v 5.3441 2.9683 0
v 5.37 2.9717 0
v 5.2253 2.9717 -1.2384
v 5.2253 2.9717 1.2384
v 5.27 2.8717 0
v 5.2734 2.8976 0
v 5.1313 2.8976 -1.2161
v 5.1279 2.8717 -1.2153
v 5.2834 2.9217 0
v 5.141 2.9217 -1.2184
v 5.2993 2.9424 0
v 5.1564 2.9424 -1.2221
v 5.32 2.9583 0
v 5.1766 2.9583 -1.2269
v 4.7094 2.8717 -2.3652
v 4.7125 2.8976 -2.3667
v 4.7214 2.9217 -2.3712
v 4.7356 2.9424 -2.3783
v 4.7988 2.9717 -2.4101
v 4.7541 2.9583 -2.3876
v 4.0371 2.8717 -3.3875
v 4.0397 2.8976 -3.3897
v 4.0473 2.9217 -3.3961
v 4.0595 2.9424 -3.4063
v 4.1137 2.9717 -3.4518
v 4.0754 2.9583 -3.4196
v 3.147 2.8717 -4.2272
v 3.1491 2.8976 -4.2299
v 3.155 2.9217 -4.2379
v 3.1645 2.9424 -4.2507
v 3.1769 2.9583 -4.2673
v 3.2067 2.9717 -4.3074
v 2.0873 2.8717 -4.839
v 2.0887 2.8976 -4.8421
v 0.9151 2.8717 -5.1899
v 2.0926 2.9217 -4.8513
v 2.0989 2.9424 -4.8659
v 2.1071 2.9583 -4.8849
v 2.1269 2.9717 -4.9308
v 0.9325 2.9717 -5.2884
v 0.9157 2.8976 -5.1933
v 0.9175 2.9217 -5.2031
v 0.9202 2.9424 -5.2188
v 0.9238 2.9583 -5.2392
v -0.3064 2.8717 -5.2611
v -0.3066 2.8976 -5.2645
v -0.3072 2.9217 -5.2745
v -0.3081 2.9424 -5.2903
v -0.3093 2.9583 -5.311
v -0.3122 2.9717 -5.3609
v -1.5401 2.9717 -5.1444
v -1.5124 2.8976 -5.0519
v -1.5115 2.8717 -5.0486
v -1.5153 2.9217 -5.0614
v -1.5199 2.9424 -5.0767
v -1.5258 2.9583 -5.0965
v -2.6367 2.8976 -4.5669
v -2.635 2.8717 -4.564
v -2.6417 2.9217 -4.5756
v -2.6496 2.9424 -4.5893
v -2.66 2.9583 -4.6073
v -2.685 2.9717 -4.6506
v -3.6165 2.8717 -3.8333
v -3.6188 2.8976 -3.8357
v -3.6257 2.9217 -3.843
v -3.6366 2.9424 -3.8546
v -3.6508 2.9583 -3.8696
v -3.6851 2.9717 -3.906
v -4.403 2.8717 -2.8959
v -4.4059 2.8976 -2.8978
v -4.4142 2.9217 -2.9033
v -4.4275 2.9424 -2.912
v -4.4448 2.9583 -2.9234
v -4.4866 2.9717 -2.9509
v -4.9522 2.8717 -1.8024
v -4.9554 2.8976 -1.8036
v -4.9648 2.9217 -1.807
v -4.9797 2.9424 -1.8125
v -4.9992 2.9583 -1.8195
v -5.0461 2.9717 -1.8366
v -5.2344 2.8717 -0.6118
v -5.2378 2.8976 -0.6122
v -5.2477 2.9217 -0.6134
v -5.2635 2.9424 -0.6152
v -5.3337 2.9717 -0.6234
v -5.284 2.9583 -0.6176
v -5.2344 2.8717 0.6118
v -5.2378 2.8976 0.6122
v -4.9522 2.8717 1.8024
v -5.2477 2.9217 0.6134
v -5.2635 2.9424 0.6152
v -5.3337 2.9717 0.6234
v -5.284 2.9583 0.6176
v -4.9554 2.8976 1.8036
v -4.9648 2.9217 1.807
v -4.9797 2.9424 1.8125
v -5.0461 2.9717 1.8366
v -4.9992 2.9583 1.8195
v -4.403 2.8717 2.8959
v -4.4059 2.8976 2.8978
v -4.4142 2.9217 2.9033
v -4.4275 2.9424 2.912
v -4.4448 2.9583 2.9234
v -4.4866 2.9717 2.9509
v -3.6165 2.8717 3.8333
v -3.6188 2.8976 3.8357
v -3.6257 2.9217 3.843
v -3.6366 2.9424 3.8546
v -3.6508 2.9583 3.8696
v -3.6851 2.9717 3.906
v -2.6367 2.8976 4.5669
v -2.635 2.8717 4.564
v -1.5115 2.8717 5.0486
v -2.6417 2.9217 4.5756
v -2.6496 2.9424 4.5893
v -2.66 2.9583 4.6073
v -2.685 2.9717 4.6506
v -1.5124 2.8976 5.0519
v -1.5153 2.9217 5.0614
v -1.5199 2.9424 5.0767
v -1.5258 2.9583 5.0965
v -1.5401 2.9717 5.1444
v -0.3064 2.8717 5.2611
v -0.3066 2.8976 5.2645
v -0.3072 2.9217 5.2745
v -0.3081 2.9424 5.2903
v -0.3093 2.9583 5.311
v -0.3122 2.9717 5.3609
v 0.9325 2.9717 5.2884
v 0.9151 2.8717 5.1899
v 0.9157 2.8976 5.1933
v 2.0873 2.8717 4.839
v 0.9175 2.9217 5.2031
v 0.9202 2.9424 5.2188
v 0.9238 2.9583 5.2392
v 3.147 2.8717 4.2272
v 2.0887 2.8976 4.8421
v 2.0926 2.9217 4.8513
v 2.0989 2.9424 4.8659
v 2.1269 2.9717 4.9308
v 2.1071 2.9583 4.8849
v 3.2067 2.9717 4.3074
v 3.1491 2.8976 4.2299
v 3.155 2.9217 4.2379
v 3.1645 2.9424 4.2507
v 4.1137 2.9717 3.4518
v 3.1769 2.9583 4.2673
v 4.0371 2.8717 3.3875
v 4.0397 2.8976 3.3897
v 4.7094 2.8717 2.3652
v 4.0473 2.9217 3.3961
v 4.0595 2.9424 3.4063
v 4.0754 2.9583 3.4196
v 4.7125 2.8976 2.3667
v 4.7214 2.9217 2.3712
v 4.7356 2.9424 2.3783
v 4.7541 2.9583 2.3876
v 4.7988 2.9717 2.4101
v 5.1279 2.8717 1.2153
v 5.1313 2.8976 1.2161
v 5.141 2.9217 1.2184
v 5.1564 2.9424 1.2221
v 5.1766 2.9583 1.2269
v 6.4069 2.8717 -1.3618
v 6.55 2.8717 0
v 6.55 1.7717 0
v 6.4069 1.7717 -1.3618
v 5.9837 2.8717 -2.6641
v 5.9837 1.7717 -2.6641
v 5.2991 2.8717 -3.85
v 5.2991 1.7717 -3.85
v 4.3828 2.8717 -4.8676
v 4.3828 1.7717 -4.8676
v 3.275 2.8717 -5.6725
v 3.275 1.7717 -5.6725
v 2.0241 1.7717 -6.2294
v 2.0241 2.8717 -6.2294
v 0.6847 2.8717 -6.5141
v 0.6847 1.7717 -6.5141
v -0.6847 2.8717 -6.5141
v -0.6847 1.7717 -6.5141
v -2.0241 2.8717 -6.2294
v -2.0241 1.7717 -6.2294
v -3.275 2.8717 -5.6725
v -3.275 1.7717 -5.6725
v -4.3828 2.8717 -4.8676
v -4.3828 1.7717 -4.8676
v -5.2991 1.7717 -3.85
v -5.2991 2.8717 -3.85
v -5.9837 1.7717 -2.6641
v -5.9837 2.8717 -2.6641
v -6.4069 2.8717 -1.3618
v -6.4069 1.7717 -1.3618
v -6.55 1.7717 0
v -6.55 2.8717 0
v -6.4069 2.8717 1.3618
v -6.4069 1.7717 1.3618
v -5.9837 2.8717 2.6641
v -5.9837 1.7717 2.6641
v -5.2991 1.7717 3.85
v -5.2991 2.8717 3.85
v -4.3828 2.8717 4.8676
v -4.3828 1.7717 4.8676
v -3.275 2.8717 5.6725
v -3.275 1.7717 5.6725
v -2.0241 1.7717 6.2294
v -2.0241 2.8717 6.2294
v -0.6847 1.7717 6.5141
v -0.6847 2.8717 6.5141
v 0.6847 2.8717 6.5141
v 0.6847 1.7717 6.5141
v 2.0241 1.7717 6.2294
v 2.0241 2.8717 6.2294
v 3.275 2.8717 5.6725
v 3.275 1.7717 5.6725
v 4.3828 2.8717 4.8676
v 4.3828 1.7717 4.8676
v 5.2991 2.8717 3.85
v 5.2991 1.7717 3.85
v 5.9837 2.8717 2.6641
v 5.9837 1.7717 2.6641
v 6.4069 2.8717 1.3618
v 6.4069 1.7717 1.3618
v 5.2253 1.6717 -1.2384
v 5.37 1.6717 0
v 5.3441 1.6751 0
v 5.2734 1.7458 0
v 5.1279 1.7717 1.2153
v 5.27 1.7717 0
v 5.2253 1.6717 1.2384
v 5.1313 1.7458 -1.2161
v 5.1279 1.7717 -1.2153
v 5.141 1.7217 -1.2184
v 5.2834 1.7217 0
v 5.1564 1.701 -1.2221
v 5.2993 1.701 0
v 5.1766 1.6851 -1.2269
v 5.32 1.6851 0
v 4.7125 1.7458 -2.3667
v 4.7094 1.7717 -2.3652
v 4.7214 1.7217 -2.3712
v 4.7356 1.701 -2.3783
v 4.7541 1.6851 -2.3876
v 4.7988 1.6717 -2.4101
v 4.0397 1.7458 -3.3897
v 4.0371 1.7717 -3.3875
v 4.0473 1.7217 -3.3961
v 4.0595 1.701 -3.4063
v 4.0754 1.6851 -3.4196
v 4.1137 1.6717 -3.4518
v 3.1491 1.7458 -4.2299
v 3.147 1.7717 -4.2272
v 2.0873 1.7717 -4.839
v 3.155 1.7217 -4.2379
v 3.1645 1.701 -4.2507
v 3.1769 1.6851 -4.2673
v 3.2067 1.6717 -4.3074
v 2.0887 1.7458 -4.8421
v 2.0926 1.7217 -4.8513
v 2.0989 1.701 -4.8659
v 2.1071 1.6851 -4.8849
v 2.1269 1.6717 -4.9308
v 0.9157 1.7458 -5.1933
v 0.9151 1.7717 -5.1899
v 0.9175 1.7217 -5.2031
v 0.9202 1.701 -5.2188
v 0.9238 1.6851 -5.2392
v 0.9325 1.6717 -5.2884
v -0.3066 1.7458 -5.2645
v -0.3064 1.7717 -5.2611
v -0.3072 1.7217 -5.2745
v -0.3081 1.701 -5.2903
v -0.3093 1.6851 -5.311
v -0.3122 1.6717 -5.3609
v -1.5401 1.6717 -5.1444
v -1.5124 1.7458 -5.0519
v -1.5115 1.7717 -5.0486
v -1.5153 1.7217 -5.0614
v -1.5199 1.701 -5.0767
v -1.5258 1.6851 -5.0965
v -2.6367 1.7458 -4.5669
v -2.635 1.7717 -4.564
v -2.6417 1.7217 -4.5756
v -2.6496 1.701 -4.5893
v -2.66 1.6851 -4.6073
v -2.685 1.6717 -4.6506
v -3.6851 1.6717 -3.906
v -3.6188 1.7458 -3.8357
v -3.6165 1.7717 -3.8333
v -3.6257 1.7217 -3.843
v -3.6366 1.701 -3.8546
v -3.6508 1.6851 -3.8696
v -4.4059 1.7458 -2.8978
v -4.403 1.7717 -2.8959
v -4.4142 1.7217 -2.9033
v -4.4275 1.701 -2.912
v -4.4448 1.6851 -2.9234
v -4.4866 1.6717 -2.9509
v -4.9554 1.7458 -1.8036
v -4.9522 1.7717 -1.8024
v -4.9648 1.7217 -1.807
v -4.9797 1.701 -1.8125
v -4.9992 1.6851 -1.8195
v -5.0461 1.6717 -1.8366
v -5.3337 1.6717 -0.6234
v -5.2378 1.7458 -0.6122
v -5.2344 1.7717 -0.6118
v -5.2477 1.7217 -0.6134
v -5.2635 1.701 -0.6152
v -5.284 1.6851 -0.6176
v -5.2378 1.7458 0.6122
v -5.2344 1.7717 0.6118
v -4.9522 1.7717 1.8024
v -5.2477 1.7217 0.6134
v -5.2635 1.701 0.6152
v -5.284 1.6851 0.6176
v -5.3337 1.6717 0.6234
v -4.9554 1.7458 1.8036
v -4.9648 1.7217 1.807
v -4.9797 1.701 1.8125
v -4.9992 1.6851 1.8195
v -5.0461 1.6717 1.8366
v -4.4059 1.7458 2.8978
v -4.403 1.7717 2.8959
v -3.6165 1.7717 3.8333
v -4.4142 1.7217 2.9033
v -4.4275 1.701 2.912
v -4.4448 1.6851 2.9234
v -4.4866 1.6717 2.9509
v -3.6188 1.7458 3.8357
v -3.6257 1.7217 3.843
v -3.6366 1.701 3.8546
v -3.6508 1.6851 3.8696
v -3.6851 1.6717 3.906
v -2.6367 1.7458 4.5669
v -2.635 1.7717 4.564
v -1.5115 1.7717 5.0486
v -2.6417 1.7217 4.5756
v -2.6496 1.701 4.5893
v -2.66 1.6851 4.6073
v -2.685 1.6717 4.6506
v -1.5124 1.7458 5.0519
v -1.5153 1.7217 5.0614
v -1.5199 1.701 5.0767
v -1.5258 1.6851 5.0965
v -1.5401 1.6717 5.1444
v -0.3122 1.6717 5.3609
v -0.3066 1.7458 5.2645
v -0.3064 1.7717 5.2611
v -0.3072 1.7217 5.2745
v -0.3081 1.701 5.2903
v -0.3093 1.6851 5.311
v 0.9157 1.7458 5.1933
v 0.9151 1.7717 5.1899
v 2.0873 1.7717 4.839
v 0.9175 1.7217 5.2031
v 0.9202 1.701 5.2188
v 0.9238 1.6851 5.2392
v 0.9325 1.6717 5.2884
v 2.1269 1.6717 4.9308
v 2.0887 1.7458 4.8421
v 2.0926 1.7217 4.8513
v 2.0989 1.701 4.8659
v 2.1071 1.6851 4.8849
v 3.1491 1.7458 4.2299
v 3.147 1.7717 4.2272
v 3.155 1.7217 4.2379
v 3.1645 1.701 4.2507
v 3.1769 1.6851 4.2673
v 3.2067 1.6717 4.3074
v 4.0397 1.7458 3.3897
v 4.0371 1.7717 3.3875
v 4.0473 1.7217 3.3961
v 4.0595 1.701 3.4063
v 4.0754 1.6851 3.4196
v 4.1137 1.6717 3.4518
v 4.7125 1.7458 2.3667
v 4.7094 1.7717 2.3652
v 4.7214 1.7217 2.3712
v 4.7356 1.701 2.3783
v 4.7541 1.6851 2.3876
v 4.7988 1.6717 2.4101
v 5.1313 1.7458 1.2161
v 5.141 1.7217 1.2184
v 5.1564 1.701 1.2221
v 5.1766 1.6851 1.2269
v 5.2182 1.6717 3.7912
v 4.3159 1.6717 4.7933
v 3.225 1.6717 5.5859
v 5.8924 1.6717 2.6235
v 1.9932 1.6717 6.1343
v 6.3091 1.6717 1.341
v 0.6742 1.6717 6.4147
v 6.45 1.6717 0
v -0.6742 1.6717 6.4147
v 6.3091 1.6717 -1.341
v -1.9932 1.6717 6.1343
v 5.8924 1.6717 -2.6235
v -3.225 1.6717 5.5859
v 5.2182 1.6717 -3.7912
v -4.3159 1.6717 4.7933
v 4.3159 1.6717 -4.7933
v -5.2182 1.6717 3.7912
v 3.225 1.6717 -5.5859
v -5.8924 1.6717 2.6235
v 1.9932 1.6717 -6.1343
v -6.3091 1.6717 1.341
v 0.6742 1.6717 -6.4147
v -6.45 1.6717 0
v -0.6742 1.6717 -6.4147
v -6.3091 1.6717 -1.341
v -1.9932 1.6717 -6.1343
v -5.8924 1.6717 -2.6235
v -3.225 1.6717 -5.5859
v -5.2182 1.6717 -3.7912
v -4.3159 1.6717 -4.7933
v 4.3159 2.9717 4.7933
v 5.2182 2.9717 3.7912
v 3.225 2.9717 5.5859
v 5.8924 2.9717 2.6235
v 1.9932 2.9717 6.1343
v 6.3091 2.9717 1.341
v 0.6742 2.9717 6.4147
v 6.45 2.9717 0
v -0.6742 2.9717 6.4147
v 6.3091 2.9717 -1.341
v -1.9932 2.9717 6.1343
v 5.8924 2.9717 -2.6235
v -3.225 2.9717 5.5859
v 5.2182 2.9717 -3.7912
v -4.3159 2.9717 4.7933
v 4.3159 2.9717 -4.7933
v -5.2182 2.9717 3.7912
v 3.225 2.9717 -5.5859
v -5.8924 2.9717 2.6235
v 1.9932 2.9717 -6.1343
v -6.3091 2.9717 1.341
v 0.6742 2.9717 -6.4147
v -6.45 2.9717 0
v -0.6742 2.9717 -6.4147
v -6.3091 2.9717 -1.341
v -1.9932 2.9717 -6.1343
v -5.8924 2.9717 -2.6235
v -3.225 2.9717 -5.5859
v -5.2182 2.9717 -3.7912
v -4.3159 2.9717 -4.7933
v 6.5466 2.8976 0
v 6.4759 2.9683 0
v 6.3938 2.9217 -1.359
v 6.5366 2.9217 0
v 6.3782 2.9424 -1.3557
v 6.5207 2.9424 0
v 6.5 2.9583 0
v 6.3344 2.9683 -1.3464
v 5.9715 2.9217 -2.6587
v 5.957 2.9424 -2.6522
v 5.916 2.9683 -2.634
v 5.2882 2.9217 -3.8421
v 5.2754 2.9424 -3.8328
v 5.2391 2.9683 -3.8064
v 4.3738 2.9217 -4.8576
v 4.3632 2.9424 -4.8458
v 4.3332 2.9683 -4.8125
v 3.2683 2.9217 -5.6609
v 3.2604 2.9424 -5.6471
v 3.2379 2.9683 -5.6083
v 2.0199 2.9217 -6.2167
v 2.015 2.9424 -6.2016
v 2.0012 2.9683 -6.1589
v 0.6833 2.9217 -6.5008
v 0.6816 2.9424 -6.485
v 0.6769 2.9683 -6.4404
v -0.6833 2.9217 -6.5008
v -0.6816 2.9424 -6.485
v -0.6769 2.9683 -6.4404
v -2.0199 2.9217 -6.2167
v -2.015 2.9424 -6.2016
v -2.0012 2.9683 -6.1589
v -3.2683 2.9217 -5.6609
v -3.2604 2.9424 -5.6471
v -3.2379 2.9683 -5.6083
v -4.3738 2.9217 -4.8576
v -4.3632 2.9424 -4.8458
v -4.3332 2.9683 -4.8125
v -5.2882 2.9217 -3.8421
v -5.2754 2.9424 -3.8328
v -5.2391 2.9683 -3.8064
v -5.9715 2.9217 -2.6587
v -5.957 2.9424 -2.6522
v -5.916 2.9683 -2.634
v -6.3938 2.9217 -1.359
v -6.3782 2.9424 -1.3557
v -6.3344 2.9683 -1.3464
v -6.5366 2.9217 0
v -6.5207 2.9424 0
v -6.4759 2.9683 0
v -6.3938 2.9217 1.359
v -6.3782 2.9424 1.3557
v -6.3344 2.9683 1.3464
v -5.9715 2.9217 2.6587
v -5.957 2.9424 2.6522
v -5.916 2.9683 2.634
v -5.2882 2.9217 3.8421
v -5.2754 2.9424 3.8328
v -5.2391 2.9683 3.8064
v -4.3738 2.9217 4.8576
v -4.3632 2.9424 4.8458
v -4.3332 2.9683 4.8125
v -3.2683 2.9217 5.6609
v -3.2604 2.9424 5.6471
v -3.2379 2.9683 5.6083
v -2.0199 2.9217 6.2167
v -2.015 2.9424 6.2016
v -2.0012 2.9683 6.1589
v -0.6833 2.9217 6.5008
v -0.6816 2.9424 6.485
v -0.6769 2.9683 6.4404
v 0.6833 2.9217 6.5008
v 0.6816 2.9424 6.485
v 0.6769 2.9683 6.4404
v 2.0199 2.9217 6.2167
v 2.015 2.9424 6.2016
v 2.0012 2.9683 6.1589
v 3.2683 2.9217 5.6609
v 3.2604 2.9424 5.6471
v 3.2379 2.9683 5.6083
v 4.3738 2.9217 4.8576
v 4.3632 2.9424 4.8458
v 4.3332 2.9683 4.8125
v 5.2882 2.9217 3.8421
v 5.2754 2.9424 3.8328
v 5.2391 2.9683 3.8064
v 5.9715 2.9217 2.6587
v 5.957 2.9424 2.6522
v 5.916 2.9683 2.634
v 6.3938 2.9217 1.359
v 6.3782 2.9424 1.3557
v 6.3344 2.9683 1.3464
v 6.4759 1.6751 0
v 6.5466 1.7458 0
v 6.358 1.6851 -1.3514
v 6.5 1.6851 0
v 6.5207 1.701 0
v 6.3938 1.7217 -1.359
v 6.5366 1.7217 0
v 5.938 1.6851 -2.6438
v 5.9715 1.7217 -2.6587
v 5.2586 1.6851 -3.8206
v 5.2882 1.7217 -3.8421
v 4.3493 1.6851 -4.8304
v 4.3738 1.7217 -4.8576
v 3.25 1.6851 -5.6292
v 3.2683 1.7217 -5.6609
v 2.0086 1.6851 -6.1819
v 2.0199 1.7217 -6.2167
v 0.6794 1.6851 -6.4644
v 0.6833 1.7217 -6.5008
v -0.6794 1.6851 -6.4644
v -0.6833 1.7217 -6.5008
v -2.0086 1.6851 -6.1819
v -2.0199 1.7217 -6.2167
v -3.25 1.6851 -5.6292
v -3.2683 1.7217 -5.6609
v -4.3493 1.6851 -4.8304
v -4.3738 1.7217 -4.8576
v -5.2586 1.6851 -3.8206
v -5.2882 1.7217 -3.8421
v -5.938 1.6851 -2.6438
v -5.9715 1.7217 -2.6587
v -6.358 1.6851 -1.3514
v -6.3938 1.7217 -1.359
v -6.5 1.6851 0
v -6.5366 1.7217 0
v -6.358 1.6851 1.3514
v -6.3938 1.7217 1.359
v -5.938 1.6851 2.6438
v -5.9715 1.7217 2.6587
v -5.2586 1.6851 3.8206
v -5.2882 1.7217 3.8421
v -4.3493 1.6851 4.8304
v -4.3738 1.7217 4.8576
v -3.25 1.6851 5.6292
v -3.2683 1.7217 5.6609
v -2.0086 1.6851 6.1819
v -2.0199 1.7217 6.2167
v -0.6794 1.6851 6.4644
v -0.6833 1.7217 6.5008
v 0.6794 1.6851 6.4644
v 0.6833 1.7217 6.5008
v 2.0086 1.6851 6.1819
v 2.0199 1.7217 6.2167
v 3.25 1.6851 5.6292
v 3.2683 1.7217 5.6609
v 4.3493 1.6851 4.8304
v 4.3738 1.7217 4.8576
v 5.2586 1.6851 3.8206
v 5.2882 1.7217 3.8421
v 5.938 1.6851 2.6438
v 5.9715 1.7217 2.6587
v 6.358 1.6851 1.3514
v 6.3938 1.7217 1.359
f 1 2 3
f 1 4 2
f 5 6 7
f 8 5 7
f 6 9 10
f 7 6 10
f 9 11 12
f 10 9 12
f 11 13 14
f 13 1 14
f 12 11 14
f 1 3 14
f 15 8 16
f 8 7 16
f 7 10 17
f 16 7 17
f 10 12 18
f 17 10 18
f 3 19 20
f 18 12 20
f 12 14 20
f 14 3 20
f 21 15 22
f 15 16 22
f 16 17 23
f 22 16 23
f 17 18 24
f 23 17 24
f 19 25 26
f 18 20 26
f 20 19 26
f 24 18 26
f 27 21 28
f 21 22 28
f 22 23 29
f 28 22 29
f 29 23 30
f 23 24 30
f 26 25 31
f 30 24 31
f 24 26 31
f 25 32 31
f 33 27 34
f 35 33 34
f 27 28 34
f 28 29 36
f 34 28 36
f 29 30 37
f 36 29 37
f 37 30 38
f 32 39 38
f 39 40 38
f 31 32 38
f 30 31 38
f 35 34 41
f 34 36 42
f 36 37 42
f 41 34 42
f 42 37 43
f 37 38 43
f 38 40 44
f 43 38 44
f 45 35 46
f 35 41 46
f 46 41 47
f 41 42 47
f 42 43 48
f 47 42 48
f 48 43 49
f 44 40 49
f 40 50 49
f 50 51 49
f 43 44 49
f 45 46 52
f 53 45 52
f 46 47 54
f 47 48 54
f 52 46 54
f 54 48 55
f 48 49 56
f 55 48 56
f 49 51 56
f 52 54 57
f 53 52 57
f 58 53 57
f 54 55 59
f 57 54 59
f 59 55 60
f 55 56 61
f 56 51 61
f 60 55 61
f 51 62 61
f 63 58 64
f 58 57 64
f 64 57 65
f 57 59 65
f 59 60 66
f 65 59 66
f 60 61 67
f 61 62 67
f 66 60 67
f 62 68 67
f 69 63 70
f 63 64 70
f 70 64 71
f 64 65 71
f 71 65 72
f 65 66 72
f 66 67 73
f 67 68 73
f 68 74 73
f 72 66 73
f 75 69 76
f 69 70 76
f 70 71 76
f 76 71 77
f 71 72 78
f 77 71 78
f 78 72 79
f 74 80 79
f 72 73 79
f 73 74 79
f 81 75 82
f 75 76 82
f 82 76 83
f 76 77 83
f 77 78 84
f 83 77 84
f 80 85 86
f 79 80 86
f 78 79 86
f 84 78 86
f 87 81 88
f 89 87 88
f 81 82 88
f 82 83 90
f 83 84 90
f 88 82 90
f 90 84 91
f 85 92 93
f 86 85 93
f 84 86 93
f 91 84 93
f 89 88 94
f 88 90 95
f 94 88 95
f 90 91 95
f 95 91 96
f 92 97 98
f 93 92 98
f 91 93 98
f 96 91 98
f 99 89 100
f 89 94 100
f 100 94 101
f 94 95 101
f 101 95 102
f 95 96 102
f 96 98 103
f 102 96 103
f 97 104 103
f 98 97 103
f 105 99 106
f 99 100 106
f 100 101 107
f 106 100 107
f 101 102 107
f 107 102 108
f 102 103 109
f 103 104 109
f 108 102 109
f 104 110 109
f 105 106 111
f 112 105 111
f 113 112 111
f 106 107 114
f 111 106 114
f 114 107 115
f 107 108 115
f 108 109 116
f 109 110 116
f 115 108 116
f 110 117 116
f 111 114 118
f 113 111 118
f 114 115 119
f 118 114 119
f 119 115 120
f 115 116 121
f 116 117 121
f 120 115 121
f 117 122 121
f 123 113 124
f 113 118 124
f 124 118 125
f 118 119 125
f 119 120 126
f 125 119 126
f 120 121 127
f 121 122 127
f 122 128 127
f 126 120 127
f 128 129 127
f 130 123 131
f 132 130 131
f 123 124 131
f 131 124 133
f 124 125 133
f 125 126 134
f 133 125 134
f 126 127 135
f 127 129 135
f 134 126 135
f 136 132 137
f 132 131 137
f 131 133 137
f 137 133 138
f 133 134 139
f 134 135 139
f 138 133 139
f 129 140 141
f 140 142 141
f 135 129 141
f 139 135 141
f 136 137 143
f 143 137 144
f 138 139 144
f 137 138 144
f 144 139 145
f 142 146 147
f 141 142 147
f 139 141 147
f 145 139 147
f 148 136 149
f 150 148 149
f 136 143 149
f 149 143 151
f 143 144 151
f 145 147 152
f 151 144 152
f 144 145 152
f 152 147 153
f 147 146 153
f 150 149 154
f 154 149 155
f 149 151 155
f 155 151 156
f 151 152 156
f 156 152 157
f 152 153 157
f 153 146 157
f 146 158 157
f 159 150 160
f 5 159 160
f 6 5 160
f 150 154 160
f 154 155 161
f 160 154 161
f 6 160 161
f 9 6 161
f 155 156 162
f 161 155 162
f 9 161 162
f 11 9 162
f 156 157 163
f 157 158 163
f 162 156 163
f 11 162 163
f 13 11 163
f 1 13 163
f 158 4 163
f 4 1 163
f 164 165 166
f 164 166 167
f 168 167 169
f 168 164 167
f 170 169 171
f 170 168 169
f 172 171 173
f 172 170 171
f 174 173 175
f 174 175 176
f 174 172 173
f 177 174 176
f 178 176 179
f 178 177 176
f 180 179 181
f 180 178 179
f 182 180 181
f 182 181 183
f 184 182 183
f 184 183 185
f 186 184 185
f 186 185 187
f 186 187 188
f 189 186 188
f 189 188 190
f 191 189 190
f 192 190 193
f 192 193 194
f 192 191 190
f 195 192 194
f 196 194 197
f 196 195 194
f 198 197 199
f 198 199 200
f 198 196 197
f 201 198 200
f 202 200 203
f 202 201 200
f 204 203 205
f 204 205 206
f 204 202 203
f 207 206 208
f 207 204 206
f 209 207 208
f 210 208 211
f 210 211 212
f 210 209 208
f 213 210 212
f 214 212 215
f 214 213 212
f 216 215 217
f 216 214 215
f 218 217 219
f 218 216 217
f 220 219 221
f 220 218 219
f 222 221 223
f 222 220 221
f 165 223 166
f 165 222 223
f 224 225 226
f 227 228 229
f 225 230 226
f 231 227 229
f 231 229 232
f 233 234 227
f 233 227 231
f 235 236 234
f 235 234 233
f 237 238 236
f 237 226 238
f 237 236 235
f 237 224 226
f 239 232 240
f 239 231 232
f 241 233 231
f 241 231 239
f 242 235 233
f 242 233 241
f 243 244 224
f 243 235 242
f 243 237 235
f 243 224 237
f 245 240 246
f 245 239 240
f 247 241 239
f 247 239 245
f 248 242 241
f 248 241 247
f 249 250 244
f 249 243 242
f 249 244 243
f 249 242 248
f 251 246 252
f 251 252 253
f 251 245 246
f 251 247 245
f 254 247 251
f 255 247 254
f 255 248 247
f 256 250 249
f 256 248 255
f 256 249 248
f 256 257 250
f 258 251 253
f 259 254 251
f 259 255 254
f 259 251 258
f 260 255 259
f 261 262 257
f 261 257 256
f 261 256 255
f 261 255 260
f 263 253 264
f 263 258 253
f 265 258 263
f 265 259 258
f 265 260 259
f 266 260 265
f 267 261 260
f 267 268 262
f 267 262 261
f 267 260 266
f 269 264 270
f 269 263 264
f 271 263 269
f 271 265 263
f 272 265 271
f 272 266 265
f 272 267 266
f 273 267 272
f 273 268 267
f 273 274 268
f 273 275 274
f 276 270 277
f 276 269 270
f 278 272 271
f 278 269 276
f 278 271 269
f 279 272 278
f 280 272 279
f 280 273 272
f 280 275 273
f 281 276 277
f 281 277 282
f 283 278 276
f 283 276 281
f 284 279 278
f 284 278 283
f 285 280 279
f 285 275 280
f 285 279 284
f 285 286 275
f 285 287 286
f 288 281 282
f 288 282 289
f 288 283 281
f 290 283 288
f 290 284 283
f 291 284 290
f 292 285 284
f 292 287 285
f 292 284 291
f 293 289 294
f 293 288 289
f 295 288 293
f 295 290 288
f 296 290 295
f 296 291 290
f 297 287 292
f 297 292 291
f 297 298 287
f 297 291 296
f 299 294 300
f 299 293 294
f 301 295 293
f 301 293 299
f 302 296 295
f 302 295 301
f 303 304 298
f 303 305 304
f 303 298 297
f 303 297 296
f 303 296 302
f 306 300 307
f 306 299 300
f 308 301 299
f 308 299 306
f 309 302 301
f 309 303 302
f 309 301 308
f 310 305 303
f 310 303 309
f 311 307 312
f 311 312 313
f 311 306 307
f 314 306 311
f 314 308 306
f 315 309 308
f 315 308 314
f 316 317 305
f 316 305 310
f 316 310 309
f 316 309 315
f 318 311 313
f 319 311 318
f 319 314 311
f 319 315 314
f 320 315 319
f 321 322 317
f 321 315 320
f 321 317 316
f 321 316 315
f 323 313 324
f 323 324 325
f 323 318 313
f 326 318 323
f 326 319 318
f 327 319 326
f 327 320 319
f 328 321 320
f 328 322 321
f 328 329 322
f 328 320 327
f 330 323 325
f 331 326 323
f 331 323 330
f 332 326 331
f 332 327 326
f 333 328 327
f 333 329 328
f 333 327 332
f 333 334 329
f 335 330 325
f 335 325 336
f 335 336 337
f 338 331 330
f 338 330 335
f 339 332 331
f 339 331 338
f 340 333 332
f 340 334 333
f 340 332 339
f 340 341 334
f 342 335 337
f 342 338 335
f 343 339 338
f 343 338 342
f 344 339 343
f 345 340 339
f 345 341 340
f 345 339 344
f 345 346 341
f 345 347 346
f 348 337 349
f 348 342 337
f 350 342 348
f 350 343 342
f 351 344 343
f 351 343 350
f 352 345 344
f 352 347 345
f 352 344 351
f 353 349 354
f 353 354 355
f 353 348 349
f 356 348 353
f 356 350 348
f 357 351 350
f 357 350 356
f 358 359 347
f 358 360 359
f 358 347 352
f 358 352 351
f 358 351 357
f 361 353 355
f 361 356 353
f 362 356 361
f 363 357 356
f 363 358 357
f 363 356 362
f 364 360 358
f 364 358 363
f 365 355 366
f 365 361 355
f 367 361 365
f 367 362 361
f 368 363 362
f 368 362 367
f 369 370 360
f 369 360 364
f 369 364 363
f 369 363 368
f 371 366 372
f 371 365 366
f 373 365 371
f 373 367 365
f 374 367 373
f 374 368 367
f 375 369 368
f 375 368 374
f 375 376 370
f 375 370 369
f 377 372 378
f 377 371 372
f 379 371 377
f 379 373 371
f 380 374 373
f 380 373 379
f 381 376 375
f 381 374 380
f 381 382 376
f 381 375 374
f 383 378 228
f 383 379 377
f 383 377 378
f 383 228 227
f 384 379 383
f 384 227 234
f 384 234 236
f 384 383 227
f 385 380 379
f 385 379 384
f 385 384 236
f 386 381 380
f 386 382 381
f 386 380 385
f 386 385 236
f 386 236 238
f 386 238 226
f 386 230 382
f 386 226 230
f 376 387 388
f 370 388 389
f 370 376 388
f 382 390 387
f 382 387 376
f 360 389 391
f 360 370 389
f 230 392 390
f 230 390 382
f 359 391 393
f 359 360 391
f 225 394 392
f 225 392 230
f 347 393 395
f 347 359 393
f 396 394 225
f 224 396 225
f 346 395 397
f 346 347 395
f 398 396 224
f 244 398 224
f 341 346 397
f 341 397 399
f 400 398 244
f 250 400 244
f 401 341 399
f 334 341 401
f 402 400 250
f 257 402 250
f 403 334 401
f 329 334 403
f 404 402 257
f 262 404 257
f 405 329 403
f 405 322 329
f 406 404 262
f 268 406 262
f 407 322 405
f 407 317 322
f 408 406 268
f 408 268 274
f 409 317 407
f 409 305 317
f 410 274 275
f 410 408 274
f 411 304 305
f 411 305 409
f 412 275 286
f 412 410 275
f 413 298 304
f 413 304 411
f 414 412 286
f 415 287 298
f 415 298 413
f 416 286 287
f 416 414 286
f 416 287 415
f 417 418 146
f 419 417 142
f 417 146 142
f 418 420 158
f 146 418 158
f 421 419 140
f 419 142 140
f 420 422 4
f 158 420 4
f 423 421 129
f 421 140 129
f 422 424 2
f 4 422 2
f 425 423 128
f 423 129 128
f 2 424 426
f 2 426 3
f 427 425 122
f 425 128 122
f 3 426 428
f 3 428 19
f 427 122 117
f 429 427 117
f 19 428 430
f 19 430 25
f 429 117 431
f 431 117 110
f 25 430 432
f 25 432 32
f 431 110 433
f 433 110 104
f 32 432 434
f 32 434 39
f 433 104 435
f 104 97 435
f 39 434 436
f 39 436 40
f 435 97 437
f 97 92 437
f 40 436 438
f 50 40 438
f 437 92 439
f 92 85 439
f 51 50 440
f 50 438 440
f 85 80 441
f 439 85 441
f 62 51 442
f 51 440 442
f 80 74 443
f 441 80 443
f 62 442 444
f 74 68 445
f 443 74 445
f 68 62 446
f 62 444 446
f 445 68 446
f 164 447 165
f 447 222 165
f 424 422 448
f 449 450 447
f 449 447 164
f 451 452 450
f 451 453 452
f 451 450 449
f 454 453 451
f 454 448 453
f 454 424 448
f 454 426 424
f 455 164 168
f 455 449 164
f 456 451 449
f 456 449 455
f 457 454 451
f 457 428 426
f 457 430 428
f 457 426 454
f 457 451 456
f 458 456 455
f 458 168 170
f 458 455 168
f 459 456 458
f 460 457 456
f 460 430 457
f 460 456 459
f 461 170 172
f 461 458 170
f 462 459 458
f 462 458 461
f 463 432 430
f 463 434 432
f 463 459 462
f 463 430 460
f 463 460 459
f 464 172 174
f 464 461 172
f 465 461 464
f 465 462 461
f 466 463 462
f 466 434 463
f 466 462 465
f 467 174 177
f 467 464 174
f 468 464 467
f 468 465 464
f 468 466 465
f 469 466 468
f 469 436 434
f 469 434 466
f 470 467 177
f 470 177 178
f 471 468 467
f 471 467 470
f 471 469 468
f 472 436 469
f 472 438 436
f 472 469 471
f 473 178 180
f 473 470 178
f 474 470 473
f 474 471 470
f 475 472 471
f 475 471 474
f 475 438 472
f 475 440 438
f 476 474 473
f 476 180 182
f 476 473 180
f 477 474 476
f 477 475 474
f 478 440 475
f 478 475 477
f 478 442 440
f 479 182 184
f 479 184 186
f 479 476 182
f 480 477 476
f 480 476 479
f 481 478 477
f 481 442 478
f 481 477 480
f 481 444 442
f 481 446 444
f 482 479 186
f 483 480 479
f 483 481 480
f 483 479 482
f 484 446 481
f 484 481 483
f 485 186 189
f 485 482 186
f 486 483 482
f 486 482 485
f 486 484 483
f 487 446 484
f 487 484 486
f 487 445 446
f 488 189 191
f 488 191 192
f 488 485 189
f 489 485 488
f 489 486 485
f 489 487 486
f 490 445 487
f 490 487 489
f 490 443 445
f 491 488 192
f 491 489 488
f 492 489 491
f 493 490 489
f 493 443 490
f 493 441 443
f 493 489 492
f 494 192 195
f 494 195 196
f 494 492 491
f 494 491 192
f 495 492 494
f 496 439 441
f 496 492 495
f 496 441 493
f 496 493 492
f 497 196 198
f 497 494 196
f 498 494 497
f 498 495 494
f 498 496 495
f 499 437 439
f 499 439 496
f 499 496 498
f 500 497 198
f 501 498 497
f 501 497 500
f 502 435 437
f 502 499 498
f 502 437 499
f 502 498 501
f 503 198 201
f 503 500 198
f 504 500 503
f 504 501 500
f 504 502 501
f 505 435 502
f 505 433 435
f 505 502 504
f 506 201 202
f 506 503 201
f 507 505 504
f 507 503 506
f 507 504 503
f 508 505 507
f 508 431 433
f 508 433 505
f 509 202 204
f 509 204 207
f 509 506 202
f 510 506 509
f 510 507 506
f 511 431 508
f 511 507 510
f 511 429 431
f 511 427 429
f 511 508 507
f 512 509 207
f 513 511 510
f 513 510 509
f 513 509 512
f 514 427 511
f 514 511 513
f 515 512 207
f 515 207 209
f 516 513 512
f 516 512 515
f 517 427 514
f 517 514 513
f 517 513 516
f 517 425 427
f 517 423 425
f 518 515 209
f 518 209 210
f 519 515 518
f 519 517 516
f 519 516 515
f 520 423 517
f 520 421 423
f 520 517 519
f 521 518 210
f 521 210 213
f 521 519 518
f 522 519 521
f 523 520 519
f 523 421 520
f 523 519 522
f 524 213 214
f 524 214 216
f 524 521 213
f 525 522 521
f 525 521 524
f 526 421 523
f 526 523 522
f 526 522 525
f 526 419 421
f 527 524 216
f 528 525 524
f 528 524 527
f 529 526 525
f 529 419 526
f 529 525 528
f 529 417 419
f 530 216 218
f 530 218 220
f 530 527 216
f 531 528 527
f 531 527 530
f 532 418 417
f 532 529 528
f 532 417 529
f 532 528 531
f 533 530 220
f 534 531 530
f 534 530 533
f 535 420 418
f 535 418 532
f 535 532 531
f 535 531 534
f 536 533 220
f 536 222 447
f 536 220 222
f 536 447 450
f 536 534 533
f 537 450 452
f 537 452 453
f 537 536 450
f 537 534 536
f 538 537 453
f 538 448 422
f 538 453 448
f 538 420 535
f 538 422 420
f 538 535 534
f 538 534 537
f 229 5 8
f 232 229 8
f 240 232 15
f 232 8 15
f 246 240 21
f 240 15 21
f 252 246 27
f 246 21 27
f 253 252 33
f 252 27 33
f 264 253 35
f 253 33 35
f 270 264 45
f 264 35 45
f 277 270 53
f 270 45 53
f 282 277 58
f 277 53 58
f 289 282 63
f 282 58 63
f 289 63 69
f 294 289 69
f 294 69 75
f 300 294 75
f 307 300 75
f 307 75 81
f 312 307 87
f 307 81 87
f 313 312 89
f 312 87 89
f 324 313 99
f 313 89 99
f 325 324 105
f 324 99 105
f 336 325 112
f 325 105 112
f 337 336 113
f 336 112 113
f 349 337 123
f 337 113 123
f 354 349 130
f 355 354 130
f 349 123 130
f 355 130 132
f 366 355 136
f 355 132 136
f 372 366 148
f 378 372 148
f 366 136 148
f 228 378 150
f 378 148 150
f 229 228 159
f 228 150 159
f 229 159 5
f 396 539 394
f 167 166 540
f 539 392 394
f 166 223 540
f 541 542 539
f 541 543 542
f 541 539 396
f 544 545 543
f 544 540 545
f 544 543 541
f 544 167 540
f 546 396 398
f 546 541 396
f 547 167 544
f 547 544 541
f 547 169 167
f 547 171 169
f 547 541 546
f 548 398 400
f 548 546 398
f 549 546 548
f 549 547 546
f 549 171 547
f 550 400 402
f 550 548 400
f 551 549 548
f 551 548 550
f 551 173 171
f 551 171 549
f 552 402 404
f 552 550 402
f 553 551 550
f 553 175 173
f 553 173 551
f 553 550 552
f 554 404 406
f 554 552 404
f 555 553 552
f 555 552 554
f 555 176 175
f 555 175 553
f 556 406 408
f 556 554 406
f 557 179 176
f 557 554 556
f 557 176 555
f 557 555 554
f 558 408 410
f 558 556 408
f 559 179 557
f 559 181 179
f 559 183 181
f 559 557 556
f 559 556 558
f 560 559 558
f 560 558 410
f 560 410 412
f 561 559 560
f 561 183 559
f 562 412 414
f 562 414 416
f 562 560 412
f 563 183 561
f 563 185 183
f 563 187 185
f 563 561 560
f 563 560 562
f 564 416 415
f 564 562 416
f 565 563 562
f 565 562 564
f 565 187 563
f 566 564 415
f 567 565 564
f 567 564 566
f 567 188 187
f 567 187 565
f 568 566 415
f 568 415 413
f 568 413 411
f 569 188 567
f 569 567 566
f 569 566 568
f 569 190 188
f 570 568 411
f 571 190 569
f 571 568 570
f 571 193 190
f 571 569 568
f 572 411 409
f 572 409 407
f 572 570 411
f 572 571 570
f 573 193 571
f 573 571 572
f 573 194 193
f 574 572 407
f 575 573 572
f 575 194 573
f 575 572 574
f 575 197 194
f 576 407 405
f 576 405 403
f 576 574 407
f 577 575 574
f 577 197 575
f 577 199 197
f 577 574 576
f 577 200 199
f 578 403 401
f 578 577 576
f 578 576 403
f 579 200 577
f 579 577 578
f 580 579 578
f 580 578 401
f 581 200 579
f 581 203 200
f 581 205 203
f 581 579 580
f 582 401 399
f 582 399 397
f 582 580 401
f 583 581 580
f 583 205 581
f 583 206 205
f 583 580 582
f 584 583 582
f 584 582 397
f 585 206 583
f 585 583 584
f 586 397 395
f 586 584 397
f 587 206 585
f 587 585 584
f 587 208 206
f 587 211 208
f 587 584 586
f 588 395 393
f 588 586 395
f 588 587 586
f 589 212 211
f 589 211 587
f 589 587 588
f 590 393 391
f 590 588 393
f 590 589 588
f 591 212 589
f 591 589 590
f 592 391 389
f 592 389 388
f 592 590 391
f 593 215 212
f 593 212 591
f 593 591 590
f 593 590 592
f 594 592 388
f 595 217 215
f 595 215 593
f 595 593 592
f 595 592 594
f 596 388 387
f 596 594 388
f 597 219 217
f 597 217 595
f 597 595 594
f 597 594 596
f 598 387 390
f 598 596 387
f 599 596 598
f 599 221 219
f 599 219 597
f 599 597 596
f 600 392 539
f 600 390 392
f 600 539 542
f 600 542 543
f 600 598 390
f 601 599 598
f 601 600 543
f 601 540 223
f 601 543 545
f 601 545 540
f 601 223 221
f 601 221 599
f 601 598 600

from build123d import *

# Parameters (mm, degrees)
ESQUISSE1_W = 1.28
ESQUISSE1_H = 1.3
CONG_1_R    = 0.1


with BuildPart() as part:
    # Esquisse1 → Révolution1 (revolve)
    with BuildSketch(Plane.XY):
        with Locations((5.91, 2.321727173)):
            Rectangle(ESQUISSE1_W, ESQUISSE1_H)
    revolve(axis=Axis((0, 0, 0), (0, 1, 0)))

    # Congé1
    cong_1_edges = [part.edges().sort_by_distance(p)[0] for p in [
        (-5.27, 2.971727173, 0),
        (-6.55, 2.971727173, 0),
        (-6.55, 1.671727173, 0),
        (-5.27, 1.671727173, 0),
    ]]
    fillet(cong_1_edges, radius=CONG_1_R)


solid = part.part
